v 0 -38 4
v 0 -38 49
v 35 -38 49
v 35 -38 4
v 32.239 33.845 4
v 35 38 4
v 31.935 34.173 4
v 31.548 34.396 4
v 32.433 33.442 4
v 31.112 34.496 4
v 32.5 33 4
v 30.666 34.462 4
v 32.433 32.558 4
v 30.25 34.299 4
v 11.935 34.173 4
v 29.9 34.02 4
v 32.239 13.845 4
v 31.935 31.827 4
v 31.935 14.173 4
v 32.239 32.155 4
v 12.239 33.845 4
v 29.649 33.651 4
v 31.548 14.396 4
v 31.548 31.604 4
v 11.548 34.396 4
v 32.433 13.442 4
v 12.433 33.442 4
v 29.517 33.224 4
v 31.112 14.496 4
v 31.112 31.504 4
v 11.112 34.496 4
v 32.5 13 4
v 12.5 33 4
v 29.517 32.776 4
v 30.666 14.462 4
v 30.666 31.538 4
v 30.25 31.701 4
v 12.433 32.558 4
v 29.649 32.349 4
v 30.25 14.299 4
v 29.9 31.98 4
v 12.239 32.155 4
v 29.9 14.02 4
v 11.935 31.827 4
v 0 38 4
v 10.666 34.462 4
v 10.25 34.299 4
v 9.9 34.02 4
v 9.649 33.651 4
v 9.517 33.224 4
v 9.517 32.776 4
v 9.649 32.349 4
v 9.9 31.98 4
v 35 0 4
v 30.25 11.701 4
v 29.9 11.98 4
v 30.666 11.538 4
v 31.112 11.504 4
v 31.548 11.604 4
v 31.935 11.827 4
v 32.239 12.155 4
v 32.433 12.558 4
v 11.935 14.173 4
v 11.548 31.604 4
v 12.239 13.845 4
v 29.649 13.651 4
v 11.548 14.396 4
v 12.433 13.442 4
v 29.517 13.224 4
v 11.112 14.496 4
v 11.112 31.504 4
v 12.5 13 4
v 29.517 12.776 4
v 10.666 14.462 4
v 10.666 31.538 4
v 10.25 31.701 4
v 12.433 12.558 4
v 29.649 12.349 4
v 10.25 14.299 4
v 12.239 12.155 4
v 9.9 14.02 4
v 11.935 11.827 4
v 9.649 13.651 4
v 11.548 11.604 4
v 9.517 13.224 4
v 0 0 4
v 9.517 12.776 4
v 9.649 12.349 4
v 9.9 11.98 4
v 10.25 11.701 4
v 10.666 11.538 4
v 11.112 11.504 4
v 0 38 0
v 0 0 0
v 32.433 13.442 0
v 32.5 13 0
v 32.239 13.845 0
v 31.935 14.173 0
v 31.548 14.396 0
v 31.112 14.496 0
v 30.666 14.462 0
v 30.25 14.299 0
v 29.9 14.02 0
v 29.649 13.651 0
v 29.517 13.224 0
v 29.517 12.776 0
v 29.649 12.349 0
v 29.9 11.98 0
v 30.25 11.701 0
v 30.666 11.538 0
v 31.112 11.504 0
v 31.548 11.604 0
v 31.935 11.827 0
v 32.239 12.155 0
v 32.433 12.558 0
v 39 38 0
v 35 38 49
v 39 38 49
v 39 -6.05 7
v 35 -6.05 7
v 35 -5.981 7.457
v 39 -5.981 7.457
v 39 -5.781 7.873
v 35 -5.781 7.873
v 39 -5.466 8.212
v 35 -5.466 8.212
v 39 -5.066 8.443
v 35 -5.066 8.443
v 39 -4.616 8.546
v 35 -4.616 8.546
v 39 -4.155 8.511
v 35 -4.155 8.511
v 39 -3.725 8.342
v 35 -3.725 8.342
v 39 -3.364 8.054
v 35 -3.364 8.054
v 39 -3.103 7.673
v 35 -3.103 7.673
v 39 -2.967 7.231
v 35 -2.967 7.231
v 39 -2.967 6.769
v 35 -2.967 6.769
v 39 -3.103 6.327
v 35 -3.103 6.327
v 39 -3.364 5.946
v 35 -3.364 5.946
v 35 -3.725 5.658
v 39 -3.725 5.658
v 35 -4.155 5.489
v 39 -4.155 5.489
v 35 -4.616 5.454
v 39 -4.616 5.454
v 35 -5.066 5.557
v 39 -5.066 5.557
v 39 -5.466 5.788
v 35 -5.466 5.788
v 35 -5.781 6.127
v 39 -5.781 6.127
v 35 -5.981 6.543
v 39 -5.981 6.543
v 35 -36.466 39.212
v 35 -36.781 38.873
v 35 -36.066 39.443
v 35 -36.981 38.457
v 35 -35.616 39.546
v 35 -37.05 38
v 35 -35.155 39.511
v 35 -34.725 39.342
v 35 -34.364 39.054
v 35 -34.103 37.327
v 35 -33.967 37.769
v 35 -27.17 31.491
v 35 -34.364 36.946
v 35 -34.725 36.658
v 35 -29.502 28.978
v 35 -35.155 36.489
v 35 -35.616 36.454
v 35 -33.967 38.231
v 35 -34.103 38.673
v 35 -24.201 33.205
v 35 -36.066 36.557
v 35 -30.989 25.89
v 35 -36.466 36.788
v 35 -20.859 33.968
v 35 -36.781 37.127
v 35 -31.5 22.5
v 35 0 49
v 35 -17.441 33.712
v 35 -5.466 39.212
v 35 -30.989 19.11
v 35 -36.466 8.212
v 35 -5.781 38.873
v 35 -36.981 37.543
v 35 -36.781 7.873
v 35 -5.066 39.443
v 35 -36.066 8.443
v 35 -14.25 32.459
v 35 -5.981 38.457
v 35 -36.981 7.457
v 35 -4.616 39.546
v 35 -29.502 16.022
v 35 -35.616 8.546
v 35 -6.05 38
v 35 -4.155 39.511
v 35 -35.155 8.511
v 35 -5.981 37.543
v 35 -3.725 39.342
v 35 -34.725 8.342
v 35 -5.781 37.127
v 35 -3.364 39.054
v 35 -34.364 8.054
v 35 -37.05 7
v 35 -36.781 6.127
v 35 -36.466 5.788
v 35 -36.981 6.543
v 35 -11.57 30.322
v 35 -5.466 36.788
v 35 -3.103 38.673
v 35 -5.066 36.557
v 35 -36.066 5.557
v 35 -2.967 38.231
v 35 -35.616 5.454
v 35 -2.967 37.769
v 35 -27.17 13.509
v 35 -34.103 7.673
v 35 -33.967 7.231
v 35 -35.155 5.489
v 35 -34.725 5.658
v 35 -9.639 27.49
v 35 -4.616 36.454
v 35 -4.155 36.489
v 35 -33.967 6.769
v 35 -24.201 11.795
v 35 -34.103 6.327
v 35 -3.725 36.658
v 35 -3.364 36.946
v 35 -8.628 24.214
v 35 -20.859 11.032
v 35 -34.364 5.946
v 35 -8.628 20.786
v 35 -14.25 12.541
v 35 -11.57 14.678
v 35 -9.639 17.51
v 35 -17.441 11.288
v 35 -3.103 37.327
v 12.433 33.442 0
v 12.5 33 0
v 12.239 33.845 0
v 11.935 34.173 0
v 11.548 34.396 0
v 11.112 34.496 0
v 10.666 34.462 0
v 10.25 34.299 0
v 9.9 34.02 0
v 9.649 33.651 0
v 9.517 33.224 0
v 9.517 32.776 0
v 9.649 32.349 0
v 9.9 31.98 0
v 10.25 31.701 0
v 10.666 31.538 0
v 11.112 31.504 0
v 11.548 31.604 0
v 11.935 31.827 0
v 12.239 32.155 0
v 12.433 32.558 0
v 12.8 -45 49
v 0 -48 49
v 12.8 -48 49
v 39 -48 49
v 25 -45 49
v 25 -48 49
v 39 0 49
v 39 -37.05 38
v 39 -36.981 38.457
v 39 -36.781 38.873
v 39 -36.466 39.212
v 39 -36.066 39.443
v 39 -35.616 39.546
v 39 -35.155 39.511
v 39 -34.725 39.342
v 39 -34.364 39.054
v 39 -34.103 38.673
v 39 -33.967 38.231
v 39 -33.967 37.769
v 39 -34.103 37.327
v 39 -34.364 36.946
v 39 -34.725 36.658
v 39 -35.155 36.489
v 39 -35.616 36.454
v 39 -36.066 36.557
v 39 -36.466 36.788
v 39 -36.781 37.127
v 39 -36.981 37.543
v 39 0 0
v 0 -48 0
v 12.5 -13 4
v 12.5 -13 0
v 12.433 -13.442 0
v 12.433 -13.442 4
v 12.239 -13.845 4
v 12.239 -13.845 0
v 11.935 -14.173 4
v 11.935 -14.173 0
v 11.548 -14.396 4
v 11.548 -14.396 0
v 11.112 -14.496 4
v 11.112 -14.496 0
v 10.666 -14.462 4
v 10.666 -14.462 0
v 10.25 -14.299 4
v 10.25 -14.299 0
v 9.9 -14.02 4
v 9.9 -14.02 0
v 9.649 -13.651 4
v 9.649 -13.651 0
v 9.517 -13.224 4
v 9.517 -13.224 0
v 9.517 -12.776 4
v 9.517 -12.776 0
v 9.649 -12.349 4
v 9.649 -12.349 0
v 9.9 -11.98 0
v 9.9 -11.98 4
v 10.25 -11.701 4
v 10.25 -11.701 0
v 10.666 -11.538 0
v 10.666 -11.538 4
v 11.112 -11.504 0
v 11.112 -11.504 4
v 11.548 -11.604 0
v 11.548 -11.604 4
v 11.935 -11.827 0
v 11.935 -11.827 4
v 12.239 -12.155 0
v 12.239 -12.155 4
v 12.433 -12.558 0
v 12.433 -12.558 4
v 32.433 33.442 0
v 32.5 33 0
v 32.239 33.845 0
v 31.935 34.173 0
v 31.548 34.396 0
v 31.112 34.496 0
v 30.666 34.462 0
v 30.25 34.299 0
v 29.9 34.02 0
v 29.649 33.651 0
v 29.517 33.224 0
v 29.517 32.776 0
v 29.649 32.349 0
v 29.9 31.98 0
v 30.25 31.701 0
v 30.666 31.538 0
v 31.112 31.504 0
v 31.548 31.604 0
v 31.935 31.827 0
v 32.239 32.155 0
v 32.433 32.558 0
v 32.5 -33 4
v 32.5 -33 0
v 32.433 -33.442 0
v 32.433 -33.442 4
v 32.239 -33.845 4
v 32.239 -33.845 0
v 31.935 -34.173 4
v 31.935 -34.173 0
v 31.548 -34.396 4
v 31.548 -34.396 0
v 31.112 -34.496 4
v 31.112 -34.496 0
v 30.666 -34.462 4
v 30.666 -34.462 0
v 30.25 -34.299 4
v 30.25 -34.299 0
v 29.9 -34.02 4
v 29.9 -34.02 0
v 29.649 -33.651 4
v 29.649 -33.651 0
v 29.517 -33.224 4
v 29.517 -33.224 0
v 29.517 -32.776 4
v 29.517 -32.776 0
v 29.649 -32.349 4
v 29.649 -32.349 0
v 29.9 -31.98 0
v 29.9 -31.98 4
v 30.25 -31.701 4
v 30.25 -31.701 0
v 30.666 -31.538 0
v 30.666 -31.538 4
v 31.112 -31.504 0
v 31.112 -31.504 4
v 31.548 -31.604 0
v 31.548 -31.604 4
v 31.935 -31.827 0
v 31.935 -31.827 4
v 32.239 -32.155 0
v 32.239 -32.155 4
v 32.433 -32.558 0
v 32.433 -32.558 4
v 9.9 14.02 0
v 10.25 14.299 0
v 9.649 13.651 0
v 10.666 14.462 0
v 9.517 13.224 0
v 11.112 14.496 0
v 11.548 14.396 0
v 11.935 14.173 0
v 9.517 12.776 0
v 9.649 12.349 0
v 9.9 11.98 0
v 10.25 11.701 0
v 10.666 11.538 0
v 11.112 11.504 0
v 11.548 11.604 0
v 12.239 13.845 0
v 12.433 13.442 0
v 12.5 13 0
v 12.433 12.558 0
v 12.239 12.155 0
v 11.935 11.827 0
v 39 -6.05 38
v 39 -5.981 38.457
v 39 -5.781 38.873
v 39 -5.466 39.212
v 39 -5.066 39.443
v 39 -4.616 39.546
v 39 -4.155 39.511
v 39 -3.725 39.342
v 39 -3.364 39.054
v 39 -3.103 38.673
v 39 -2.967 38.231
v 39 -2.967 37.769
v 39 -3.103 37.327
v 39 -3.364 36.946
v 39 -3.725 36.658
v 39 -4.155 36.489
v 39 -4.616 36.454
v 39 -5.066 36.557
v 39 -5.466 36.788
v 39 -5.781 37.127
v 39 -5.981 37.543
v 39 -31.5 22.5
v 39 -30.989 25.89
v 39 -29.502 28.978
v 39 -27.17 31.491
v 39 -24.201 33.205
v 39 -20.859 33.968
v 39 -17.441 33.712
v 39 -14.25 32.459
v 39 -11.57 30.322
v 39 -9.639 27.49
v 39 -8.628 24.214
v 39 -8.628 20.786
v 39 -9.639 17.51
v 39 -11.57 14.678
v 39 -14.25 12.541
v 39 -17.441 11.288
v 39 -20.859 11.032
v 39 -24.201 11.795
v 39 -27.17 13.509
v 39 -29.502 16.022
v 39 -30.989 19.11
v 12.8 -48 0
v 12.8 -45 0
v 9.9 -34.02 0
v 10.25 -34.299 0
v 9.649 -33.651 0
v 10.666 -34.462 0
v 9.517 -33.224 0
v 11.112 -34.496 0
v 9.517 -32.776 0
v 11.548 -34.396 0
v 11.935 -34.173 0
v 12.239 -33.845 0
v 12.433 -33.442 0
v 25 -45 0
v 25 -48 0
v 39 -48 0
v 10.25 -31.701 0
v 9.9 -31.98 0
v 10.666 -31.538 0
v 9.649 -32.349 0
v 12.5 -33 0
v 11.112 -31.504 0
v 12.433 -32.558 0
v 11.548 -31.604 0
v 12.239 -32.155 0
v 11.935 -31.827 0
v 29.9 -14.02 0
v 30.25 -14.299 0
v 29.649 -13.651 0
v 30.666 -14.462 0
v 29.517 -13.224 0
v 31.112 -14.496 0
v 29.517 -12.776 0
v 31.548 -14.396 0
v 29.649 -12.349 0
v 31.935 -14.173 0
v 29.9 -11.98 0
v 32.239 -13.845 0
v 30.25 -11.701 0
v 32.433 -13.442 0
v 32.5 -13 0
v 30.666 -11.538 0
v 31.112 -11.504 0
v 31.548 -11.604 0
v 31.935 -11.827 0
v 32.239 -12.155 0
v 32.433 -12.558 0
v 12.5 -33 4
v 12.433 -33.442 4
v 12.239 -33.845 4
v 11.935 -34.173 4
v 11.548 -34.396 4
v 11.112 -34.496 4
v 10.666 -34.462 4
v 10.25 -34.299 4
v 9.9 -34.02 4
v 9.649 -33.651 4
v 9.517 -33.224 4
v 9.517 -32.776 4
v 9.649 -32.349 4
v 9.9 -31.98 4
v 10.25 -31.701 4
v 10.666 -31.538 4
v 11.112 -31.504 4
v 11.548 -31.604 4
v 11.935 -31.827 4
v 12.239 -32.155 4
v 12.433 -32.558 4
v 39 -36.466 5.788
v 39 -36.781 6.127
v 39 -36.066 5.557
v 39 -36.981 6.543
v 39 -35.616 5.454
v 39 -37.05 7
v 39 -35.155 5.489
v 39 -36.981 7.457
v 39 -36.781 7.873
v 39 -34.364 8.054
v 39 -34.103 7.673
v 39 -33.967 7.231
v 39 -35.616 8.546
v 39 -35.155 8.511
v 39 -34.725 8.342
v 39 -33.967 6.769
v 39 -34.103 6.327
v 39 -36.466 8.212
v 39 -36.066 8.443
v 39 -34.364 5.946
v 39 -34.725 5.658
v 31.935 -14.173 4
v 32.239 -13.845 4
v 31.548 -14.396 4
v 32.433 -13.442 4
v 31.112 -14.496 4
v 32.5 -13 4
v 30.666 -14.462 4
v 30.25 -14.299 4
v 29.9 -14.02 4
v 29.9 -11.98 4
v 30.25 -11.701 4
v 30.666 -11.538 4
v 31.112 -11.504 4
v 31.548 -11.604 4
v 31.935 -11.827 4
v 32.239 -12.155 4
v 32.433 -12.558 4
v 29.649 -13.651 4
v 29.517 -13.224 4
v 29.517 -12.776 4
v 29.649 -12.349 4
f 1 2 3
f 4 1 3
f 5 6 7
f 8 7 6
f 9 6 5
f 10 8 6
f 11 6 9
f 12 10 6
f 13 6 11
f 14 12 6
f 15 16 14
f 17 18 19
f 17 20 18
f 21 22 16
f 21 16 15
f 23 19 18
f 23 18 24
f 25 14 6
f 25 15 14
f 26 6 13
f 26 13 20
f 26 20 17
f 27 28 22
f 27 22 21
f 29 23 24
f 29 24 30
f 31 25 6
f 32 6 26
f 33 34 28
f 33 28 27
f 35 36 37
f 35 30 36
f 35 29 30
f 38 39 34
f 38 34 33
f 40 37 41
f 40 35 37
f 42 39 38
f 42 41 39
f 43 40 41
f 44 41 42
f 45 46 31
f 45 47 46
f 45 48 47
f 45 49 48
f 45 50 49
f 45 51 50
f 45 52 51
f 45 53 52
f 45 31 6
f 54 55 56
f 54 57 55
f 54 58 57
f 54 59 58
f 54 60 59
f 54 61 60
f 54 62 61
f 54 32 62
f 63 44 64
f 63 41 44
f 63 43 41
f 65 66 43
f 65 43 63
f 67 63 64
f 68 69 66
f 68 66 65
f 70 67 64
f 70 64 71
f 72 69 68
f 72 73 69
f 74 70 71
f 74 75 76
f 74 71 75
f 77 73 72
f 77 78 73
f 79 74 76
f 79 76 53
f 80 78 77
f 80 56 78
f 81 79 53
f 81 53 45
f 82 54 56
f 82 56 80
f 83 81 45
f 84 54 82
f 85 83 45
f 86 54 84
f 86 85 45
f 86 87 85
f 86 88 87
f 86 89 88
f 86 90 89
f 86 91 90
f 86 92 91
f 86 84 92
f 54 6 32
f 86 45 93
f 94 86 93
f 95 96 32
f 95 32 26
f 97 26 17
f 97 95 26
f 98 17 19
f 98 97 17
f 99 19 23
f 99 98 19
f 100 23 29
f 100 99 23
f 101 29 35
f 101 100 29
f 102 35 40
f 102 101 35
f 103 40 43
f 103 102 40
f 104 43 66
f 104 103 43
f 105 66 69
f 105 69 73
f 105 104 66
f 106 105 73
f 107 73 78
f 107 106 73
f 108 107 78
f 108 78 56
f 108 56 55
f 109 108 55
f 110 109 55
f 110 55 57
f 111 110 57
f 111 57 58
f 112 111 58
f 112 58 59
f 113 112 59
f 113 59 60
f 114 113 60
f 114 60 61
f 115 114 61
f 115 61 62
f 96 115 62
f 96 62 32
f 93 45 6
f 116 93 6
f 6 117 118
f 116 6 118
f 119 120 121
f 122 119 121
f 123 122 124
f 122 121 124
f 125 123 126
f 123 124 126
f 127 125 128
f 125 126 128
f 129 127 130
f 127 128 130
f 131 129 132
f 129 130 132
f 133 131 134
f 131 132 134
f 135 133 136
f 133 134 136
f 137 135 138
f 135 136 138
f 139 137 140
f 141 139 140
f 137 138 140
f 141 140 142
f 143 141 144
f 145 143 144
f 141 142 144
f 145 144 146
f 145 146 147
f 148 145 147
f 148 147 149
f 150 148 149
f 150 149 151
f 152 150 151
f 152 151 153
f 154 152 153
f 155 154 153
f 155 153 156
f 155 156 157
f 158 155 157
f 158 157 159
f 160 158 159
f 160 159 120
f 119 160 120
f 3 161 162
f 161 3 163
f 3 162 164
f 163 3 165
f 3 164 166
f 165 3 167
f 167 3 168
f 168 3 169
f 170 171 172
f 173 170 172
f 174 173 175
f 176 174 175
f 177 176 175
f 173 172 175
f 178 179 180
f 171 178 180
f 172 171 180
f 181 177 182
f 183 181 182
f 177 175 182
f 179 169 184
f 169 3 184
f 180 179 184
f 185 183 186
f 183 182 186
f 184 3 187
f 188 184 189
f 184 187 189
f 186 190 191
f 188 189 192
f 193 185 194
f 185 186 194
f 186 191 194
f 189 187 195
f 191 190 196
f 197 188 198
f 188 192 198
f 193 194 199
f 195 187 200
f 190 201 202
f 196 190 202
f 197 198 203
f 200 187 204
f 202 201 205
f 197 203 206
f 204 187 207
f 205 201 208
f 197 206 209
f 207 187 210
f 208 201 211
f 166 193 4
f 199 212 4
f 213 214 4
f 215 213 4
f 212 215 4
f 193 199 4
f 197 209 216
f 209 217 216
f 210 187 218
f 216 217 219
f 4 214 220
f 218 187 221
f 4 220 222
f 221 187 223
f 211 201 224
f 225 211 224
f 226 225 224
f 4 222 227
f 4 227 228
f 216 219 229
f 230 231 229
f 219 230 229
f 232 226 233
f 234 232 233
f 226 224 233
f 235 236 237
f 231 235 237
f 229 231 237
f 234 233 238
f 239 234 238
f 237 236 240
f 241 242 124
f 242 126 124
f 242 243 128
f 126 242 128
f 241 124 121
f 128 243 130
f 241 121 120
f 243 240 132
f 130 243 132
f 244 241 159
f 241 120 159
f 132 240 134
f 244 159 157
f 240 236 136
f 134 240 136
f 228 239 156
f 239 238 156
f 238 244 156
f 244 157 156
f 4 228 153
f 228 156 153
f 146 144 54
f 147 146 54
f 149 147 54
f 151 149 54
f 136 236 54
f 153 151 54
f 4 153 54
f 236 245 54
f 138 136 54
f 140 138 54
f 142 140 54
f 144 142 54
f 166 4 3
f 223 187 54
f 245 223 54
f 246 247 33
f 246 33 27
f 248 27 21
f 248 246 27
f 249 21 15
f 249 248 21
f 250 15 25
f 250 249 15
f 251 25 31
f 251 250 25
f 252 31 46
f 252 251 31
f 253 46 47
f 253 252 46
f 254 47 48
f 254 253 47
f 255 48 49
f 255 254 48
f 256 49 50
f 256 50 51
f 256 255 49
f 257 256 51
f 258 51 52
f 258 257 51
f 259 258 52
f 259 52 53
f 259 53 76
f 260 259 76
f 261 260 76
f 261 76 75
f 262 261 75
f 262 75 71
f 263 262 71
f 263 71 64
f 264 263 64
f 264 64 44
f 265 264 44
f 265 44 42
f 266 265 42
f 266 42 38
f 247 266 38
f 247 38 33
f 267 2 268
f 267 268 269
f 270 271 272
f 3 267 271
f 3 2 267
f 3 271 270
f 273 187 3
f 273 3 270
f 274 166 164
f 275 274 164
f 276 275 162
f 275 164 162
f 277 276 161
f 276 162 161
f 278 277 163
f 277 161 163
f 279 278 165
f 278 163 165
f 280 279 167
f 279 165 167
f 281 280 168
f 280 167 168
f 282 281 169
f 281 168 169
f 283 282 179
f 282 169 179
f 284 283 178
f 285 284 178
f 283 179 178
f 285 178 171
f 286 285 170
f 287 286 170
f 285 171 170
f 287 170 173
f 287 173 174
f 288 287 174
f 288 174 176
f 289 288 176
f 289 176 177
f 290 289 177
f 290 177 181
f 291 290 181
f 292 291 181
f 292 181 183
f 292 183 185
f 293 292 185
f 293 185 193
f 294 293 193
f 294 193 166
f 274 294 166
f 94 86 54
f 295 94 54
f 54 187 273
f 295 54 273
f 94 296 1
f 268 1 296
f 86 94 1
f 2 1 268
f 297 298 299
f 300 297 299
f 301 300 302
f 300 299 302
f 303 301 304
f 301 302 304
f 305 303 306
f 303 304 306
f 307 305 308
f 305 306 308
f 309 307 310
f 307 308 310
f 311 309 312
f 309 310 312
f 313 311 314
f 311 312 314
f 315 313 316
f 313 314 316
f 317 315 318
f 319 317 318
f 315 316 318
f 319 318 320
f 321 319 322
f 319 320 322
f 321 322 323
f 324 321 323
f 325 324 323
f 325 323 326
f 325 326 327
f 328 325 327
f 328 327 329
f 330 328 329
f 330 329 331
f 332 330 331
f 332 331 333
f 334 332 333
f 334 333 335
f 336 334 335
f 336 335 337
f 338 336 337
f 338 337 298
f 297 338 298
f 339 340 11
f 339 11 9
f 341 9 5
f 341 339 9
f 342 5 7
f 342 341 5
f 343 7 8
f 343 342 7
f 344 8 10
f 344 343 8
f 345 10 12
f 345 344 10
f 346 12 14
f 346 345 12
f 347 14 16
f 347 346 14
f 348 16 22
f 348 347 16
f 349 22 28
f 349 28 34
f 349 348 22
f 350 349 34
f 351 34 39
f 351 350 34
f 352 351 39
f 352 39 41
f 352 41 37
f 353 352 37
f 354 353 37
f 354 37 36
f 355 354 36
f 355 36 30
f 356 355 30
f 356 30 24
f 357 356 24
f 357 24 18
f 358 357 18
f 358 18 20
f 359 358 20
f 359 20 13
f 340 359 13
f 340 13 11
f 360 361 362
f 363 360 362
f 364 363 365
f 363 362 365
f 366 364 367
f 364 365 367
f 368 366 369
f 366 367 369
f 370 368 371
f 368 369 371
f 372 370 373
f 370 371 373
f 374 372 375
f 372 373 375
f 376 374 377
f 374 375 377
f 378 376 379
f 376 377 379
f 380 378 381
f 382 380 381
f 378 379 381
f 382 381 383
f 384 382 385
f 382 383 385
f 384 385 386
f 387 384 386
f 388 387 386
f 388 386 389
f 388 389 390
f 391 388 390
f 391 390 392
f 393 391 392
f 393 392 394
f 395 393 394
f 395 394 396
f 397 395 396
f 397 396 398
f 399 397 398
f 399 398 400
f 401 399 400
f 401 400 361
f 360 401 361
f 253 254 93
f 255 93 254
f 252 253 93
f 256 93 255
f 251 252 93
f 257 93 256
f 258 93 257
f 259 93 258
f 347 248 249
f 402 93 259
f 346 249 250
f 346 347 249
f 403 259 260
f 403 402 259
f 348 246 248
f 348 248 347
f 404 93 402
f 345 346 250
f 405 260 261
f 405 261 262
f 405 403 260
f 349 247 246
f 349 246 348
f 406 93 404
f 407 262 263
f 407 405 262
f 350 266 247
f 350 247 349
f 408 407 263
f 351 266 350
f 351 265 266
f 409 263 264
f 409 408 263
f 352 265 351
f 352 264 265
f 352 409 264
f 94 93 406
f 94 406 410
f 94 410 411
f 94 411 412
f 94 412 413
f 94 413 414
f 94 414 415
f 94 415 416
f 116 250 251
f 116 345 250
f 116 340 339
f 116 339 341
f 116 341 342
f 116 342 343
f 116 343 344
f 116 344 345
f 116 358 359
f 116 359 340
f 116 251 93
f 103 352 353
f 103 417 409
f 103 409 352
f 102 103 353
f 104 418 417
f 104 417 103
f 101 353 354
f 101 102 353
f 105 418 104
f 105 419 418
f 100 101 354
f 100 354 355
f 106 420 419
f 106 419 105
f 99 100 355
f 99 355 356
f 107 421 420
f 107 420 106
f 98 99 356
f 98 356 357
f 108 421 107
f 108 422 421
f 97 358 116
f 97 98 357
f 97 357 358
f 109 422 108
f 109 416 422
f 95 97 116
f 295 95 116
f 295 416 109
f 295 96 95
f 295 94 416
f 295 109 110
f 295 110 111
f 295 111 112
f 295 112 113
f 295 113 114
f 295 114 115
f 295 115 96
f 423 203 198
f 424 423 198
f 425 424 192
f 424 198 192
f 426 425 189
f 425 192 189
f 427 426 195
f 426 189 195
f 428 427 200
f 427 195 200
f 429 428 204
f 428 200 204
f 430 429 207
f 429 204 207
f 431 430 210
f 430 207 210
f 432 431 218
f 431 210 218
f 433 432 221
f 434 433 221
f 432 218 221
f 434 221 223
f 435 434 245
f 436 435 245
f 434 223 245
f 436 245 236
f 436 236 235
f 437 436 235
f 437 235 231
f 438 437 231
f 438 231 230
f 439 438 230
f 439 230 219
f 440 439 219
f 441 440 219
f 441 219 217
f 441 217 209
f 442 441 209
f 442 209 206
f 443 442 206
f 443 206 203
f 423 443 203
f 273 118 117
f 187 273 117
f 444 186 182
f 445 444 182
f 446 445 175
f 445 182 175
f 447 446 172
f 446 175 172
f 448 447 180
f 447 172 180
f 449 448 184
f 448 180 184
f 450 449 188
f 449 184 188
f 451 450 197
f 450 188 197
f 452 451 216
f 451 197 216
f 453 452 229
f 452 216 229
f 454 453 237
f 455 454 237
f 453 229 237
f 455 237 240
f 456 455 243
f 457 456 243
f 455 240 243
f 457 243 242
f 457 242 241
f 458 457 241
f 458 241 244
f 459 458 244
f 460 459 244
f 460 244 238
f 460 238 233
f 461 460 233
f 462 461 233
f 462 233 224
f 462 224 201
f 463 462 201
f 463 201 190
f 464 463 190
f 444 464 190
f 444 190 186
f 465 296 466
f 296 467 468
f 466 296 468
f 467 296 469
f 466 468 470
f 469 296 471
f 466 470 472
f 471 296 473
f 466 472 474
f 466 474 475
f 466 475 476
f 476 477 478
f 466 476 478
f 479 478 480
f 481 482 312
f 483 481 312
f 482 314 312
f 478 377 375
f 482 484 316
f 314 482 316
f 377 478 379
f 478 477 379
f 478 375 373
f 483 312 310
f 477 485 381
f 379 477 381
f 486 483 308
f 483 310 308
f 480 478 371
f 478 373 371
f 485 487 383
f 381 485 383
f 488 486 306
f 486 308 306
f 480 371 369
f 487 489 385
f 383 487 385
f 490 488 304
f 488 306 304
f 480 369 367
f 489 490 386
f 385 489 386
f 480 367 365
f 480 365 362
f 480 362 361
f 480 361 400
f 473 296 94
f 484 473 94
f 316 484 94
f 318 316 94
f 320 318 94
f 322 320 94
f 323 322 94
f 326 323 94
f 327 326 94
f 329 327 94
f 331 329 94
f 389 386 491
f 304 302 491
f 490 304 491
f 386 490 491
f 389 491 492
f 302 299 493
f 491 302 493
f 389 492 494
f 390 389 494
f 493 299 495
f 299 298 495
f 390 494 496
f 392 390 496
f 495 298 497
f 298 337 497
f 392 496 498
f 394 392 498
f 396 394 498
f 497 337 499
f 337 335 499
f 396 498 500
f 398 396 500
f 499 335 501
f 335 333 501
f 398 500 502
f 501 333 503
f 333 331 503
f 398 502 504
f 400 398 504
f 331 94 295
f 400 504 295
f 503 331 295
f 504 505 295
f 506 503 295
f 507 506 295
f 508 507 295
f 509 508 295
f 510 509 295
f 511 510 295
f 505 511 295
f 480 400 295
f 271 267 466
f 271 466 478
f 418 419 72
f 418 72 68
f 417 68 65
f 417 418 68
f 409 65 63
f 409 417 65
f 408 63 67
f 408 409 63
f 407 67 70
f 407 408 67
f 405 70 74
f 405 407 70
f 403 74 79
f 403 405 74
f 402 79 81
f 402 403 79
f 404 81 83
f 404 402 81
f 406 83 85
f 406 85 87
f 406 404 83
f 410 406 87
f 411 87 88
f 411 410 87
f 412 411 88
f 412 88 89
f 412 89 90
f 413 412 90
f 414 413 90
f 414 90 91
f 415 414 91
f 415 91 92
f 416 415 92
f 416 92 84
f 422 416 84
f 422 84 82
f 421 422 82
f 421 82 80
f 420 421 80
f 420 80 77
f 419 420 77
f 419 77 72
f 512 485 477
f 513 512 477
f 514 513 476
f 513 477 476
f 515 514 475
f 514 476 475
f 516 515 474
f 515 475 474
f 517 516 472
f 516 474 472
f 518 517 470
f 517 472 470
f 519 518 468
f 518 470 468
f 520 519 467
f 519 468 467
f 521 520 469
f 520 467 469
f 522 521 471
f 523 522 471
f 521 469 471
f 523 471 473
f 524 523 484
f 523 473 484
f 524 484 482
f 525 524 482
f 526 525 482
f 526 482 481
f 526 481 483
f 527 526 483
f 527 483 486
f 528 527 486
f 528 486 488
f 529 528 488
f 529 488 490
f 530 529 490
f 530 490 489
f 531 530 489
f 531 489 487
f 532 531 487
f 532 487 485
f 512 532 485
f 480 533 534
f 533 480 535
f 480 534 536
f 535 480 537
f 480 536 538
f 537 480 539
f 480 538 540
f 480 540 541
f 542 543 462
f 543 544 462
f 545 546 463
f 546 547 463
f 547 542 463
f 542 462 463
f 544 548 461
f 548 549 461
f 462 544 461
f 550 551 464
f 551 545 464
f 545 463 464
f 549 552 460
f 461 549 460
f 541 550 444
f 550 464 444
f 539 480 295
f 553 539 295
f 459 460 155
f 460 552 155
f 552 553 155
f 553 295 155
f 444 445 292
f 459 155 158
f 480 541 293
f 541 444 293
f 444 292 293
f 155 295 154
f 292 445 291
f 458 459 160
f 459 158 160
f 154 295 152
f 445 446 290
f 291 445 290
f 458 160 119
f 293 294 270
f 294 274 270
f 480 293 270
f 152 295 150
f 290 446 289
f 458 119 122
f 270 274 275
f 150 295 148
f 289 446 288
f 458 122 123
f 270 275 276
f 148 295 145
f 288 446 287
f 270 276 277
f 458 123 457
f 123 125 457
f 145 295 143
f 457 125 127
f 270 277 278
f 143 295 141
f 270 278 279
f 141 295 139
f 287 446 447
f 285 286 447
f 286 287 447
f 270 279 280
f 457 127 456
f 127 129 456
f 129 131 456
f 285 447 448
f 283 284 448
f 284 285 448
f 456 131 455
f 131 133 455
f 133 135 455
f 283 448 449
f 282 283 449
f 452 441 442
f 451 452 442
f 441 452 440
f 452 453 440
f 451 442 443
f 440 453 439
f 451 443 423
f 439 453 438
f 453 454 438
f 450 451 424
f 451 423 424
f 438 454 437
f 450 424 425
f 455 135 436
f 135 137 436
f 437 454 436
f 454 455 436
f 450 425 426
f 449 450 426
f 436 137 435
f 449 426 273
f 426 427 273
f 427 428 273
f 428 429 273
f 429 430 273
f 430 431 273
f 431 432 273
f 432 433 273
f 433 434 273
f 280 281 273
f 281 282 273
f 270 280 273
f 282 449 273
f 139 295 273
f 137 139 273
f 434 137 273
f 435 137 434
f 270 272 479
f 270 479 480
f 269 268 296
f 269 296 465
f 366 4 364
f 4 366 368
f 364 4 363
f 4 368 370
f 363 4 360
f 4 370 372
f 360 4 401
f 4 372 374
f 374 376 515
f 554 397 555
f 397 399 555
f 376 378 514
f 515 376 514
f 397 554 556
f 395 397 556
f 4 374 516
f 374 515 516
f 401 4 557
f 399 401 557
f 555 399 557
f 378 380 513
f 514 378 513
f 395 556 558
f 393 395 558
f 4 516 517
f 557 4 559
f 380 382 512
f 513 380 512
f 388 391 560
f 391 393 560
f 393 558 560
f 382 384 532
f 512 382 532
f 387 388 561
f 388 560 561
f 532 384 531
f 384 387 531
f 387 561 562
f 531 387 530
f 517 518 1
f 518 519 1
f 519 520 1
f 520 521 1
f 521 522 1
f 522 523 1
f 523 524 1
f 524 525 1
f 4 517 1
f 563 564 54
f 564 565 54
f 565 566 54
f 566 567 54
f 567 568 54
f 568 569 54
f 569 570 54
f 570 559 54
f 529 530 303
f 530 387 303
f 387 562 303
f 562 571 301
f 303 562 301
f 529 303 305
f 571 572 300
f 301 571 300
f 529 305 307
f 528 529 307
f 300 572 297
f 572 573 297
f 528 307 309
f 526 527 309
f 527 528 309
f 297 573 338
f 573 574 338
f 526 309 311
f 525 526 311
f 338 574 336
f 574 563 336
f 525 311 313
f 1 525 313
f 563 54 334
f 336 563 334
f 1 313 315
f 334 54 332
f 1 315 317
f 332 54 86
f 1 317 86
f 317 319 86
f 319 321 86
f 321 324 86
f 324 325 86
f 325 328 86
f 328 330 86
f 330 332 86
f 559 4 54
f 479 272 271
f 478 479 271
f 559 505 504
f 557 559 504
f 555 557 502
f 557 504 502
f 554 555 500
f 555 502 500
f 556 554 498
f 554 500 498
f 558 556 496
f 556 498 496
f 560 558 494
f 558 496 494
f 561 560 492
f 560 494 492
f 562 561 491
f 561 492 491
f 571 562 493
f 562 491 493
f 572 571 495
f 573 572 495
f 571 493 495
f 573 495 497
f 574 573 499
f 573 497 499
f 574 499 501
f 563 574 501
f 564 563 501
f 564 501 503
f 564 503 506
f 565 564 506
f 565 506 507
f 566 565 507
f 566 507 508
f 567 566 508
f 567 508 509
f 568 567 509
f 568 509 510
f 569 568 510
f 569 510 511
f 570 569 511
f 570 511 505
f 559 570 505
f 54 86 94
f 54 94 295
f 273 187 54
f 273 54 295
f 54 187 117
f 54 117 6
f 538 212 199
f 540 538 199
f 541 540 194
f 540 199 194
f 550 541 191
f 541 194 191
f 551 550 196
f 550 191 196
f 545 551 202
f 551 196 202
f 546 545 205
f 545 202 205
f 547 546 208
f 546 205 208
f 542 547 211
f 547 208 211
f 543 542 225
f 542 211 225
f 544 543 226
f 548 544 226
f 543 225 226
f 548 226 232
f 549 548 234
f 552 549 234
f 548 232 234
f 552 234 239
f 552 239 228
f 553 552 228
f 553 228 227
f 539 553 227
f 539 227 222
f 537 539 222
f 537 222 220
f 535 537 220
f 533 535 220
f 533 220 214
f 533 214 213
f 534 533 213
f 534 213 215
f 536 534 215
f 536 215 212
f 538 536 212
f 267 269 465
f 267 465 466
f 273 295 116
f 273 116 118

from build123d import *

# Parameters (mm, degrees)
F1_DEPTH  = 38
F2_R      = 1.5
F3_DEPTH  = 25
F4_R      = 1.55
F4_R_2    = 11.5
F6_DEPTH  = 4.001
F7_W      = 39
F7_H      = 49
F8_DEPTH  = 10
F9_W      = 12.2
F9_H      = 3
F10_DEPTH = 49.001


with BuildPart() as f1:
    # F0 (on Front) → F1 (new body)
    with BuildSketch(Plane.XZ):
        Polygon((0, 4), (0, 0), (39, 0), (39, 25), (39, 49), (35, 49), (35, 23), (35, 4), align=None)
    extrude(amount=F1_DEPTH)

    # F2 (on face) → F3 (cut)
    with BuildSketch(Plane(origin=(0, 0, 0), x_dir=(1, 0, 0), z_dir=(0, 0, -1))):
        with Locations((11, 13)):
            Circle(F2_R)
        with Locations((31, 13)):
            Circle(F2_R)
        with Locations((11, 33)):
            Circle(F2_R)
        with Locations((31, 33)):
            Circle(F2_R)
    extrude(amount=-F3_DEPTH, mode=Mode.SUBTRACT)


with BuildPart() as f5_1:
    # F5: instance of F1
    add(f1.part.mirror(Plane.XZ))


with BuildPart() as f1_1:
    add(f1.part)

    # F4 (on face) → F6 (cut, through all)
    with BuildSketch(Plane(origin=(35, 0, 0), x_dir=(0, -1, 0), z_dir=(-1, 0, 0))):
        with Locations((4.5, 38)):
            Circle(F4_R)
        with Locations((35.5, 38)):
            Circle(F4_R)
        with Locations((4.5, 7)):
            Circle(F4_R)
        with Locations((35.5, 7)):
            Circle(F4_R)
        with Locations((20, 22.5)):
            Circle(F4_R_2)
    extrude(amount=-F6_DEPTH, mode=Mode.SUBTRACT)

    # F7 (on face) → F8 (join)
    with BuildSketch(Plane.XZ.offset(38)):
        with Locations((19.5, 24.5)):
            Rectangle(F7_W, F7_H)
    extrude(amount=F8_DEPTH)

    # F9 (on face) → F10 (cut, through all)
    with BuildSketch(Plane.XY.offset(49)):
        with Locations((18.9, -46.5)):
            Rectangle(F9_W, F9_H)
    extrude(amount=-F10_DEPTH, mode=Mode.SUBTRACT)


solid = Compound([f5_1.part, f1_1.part])
